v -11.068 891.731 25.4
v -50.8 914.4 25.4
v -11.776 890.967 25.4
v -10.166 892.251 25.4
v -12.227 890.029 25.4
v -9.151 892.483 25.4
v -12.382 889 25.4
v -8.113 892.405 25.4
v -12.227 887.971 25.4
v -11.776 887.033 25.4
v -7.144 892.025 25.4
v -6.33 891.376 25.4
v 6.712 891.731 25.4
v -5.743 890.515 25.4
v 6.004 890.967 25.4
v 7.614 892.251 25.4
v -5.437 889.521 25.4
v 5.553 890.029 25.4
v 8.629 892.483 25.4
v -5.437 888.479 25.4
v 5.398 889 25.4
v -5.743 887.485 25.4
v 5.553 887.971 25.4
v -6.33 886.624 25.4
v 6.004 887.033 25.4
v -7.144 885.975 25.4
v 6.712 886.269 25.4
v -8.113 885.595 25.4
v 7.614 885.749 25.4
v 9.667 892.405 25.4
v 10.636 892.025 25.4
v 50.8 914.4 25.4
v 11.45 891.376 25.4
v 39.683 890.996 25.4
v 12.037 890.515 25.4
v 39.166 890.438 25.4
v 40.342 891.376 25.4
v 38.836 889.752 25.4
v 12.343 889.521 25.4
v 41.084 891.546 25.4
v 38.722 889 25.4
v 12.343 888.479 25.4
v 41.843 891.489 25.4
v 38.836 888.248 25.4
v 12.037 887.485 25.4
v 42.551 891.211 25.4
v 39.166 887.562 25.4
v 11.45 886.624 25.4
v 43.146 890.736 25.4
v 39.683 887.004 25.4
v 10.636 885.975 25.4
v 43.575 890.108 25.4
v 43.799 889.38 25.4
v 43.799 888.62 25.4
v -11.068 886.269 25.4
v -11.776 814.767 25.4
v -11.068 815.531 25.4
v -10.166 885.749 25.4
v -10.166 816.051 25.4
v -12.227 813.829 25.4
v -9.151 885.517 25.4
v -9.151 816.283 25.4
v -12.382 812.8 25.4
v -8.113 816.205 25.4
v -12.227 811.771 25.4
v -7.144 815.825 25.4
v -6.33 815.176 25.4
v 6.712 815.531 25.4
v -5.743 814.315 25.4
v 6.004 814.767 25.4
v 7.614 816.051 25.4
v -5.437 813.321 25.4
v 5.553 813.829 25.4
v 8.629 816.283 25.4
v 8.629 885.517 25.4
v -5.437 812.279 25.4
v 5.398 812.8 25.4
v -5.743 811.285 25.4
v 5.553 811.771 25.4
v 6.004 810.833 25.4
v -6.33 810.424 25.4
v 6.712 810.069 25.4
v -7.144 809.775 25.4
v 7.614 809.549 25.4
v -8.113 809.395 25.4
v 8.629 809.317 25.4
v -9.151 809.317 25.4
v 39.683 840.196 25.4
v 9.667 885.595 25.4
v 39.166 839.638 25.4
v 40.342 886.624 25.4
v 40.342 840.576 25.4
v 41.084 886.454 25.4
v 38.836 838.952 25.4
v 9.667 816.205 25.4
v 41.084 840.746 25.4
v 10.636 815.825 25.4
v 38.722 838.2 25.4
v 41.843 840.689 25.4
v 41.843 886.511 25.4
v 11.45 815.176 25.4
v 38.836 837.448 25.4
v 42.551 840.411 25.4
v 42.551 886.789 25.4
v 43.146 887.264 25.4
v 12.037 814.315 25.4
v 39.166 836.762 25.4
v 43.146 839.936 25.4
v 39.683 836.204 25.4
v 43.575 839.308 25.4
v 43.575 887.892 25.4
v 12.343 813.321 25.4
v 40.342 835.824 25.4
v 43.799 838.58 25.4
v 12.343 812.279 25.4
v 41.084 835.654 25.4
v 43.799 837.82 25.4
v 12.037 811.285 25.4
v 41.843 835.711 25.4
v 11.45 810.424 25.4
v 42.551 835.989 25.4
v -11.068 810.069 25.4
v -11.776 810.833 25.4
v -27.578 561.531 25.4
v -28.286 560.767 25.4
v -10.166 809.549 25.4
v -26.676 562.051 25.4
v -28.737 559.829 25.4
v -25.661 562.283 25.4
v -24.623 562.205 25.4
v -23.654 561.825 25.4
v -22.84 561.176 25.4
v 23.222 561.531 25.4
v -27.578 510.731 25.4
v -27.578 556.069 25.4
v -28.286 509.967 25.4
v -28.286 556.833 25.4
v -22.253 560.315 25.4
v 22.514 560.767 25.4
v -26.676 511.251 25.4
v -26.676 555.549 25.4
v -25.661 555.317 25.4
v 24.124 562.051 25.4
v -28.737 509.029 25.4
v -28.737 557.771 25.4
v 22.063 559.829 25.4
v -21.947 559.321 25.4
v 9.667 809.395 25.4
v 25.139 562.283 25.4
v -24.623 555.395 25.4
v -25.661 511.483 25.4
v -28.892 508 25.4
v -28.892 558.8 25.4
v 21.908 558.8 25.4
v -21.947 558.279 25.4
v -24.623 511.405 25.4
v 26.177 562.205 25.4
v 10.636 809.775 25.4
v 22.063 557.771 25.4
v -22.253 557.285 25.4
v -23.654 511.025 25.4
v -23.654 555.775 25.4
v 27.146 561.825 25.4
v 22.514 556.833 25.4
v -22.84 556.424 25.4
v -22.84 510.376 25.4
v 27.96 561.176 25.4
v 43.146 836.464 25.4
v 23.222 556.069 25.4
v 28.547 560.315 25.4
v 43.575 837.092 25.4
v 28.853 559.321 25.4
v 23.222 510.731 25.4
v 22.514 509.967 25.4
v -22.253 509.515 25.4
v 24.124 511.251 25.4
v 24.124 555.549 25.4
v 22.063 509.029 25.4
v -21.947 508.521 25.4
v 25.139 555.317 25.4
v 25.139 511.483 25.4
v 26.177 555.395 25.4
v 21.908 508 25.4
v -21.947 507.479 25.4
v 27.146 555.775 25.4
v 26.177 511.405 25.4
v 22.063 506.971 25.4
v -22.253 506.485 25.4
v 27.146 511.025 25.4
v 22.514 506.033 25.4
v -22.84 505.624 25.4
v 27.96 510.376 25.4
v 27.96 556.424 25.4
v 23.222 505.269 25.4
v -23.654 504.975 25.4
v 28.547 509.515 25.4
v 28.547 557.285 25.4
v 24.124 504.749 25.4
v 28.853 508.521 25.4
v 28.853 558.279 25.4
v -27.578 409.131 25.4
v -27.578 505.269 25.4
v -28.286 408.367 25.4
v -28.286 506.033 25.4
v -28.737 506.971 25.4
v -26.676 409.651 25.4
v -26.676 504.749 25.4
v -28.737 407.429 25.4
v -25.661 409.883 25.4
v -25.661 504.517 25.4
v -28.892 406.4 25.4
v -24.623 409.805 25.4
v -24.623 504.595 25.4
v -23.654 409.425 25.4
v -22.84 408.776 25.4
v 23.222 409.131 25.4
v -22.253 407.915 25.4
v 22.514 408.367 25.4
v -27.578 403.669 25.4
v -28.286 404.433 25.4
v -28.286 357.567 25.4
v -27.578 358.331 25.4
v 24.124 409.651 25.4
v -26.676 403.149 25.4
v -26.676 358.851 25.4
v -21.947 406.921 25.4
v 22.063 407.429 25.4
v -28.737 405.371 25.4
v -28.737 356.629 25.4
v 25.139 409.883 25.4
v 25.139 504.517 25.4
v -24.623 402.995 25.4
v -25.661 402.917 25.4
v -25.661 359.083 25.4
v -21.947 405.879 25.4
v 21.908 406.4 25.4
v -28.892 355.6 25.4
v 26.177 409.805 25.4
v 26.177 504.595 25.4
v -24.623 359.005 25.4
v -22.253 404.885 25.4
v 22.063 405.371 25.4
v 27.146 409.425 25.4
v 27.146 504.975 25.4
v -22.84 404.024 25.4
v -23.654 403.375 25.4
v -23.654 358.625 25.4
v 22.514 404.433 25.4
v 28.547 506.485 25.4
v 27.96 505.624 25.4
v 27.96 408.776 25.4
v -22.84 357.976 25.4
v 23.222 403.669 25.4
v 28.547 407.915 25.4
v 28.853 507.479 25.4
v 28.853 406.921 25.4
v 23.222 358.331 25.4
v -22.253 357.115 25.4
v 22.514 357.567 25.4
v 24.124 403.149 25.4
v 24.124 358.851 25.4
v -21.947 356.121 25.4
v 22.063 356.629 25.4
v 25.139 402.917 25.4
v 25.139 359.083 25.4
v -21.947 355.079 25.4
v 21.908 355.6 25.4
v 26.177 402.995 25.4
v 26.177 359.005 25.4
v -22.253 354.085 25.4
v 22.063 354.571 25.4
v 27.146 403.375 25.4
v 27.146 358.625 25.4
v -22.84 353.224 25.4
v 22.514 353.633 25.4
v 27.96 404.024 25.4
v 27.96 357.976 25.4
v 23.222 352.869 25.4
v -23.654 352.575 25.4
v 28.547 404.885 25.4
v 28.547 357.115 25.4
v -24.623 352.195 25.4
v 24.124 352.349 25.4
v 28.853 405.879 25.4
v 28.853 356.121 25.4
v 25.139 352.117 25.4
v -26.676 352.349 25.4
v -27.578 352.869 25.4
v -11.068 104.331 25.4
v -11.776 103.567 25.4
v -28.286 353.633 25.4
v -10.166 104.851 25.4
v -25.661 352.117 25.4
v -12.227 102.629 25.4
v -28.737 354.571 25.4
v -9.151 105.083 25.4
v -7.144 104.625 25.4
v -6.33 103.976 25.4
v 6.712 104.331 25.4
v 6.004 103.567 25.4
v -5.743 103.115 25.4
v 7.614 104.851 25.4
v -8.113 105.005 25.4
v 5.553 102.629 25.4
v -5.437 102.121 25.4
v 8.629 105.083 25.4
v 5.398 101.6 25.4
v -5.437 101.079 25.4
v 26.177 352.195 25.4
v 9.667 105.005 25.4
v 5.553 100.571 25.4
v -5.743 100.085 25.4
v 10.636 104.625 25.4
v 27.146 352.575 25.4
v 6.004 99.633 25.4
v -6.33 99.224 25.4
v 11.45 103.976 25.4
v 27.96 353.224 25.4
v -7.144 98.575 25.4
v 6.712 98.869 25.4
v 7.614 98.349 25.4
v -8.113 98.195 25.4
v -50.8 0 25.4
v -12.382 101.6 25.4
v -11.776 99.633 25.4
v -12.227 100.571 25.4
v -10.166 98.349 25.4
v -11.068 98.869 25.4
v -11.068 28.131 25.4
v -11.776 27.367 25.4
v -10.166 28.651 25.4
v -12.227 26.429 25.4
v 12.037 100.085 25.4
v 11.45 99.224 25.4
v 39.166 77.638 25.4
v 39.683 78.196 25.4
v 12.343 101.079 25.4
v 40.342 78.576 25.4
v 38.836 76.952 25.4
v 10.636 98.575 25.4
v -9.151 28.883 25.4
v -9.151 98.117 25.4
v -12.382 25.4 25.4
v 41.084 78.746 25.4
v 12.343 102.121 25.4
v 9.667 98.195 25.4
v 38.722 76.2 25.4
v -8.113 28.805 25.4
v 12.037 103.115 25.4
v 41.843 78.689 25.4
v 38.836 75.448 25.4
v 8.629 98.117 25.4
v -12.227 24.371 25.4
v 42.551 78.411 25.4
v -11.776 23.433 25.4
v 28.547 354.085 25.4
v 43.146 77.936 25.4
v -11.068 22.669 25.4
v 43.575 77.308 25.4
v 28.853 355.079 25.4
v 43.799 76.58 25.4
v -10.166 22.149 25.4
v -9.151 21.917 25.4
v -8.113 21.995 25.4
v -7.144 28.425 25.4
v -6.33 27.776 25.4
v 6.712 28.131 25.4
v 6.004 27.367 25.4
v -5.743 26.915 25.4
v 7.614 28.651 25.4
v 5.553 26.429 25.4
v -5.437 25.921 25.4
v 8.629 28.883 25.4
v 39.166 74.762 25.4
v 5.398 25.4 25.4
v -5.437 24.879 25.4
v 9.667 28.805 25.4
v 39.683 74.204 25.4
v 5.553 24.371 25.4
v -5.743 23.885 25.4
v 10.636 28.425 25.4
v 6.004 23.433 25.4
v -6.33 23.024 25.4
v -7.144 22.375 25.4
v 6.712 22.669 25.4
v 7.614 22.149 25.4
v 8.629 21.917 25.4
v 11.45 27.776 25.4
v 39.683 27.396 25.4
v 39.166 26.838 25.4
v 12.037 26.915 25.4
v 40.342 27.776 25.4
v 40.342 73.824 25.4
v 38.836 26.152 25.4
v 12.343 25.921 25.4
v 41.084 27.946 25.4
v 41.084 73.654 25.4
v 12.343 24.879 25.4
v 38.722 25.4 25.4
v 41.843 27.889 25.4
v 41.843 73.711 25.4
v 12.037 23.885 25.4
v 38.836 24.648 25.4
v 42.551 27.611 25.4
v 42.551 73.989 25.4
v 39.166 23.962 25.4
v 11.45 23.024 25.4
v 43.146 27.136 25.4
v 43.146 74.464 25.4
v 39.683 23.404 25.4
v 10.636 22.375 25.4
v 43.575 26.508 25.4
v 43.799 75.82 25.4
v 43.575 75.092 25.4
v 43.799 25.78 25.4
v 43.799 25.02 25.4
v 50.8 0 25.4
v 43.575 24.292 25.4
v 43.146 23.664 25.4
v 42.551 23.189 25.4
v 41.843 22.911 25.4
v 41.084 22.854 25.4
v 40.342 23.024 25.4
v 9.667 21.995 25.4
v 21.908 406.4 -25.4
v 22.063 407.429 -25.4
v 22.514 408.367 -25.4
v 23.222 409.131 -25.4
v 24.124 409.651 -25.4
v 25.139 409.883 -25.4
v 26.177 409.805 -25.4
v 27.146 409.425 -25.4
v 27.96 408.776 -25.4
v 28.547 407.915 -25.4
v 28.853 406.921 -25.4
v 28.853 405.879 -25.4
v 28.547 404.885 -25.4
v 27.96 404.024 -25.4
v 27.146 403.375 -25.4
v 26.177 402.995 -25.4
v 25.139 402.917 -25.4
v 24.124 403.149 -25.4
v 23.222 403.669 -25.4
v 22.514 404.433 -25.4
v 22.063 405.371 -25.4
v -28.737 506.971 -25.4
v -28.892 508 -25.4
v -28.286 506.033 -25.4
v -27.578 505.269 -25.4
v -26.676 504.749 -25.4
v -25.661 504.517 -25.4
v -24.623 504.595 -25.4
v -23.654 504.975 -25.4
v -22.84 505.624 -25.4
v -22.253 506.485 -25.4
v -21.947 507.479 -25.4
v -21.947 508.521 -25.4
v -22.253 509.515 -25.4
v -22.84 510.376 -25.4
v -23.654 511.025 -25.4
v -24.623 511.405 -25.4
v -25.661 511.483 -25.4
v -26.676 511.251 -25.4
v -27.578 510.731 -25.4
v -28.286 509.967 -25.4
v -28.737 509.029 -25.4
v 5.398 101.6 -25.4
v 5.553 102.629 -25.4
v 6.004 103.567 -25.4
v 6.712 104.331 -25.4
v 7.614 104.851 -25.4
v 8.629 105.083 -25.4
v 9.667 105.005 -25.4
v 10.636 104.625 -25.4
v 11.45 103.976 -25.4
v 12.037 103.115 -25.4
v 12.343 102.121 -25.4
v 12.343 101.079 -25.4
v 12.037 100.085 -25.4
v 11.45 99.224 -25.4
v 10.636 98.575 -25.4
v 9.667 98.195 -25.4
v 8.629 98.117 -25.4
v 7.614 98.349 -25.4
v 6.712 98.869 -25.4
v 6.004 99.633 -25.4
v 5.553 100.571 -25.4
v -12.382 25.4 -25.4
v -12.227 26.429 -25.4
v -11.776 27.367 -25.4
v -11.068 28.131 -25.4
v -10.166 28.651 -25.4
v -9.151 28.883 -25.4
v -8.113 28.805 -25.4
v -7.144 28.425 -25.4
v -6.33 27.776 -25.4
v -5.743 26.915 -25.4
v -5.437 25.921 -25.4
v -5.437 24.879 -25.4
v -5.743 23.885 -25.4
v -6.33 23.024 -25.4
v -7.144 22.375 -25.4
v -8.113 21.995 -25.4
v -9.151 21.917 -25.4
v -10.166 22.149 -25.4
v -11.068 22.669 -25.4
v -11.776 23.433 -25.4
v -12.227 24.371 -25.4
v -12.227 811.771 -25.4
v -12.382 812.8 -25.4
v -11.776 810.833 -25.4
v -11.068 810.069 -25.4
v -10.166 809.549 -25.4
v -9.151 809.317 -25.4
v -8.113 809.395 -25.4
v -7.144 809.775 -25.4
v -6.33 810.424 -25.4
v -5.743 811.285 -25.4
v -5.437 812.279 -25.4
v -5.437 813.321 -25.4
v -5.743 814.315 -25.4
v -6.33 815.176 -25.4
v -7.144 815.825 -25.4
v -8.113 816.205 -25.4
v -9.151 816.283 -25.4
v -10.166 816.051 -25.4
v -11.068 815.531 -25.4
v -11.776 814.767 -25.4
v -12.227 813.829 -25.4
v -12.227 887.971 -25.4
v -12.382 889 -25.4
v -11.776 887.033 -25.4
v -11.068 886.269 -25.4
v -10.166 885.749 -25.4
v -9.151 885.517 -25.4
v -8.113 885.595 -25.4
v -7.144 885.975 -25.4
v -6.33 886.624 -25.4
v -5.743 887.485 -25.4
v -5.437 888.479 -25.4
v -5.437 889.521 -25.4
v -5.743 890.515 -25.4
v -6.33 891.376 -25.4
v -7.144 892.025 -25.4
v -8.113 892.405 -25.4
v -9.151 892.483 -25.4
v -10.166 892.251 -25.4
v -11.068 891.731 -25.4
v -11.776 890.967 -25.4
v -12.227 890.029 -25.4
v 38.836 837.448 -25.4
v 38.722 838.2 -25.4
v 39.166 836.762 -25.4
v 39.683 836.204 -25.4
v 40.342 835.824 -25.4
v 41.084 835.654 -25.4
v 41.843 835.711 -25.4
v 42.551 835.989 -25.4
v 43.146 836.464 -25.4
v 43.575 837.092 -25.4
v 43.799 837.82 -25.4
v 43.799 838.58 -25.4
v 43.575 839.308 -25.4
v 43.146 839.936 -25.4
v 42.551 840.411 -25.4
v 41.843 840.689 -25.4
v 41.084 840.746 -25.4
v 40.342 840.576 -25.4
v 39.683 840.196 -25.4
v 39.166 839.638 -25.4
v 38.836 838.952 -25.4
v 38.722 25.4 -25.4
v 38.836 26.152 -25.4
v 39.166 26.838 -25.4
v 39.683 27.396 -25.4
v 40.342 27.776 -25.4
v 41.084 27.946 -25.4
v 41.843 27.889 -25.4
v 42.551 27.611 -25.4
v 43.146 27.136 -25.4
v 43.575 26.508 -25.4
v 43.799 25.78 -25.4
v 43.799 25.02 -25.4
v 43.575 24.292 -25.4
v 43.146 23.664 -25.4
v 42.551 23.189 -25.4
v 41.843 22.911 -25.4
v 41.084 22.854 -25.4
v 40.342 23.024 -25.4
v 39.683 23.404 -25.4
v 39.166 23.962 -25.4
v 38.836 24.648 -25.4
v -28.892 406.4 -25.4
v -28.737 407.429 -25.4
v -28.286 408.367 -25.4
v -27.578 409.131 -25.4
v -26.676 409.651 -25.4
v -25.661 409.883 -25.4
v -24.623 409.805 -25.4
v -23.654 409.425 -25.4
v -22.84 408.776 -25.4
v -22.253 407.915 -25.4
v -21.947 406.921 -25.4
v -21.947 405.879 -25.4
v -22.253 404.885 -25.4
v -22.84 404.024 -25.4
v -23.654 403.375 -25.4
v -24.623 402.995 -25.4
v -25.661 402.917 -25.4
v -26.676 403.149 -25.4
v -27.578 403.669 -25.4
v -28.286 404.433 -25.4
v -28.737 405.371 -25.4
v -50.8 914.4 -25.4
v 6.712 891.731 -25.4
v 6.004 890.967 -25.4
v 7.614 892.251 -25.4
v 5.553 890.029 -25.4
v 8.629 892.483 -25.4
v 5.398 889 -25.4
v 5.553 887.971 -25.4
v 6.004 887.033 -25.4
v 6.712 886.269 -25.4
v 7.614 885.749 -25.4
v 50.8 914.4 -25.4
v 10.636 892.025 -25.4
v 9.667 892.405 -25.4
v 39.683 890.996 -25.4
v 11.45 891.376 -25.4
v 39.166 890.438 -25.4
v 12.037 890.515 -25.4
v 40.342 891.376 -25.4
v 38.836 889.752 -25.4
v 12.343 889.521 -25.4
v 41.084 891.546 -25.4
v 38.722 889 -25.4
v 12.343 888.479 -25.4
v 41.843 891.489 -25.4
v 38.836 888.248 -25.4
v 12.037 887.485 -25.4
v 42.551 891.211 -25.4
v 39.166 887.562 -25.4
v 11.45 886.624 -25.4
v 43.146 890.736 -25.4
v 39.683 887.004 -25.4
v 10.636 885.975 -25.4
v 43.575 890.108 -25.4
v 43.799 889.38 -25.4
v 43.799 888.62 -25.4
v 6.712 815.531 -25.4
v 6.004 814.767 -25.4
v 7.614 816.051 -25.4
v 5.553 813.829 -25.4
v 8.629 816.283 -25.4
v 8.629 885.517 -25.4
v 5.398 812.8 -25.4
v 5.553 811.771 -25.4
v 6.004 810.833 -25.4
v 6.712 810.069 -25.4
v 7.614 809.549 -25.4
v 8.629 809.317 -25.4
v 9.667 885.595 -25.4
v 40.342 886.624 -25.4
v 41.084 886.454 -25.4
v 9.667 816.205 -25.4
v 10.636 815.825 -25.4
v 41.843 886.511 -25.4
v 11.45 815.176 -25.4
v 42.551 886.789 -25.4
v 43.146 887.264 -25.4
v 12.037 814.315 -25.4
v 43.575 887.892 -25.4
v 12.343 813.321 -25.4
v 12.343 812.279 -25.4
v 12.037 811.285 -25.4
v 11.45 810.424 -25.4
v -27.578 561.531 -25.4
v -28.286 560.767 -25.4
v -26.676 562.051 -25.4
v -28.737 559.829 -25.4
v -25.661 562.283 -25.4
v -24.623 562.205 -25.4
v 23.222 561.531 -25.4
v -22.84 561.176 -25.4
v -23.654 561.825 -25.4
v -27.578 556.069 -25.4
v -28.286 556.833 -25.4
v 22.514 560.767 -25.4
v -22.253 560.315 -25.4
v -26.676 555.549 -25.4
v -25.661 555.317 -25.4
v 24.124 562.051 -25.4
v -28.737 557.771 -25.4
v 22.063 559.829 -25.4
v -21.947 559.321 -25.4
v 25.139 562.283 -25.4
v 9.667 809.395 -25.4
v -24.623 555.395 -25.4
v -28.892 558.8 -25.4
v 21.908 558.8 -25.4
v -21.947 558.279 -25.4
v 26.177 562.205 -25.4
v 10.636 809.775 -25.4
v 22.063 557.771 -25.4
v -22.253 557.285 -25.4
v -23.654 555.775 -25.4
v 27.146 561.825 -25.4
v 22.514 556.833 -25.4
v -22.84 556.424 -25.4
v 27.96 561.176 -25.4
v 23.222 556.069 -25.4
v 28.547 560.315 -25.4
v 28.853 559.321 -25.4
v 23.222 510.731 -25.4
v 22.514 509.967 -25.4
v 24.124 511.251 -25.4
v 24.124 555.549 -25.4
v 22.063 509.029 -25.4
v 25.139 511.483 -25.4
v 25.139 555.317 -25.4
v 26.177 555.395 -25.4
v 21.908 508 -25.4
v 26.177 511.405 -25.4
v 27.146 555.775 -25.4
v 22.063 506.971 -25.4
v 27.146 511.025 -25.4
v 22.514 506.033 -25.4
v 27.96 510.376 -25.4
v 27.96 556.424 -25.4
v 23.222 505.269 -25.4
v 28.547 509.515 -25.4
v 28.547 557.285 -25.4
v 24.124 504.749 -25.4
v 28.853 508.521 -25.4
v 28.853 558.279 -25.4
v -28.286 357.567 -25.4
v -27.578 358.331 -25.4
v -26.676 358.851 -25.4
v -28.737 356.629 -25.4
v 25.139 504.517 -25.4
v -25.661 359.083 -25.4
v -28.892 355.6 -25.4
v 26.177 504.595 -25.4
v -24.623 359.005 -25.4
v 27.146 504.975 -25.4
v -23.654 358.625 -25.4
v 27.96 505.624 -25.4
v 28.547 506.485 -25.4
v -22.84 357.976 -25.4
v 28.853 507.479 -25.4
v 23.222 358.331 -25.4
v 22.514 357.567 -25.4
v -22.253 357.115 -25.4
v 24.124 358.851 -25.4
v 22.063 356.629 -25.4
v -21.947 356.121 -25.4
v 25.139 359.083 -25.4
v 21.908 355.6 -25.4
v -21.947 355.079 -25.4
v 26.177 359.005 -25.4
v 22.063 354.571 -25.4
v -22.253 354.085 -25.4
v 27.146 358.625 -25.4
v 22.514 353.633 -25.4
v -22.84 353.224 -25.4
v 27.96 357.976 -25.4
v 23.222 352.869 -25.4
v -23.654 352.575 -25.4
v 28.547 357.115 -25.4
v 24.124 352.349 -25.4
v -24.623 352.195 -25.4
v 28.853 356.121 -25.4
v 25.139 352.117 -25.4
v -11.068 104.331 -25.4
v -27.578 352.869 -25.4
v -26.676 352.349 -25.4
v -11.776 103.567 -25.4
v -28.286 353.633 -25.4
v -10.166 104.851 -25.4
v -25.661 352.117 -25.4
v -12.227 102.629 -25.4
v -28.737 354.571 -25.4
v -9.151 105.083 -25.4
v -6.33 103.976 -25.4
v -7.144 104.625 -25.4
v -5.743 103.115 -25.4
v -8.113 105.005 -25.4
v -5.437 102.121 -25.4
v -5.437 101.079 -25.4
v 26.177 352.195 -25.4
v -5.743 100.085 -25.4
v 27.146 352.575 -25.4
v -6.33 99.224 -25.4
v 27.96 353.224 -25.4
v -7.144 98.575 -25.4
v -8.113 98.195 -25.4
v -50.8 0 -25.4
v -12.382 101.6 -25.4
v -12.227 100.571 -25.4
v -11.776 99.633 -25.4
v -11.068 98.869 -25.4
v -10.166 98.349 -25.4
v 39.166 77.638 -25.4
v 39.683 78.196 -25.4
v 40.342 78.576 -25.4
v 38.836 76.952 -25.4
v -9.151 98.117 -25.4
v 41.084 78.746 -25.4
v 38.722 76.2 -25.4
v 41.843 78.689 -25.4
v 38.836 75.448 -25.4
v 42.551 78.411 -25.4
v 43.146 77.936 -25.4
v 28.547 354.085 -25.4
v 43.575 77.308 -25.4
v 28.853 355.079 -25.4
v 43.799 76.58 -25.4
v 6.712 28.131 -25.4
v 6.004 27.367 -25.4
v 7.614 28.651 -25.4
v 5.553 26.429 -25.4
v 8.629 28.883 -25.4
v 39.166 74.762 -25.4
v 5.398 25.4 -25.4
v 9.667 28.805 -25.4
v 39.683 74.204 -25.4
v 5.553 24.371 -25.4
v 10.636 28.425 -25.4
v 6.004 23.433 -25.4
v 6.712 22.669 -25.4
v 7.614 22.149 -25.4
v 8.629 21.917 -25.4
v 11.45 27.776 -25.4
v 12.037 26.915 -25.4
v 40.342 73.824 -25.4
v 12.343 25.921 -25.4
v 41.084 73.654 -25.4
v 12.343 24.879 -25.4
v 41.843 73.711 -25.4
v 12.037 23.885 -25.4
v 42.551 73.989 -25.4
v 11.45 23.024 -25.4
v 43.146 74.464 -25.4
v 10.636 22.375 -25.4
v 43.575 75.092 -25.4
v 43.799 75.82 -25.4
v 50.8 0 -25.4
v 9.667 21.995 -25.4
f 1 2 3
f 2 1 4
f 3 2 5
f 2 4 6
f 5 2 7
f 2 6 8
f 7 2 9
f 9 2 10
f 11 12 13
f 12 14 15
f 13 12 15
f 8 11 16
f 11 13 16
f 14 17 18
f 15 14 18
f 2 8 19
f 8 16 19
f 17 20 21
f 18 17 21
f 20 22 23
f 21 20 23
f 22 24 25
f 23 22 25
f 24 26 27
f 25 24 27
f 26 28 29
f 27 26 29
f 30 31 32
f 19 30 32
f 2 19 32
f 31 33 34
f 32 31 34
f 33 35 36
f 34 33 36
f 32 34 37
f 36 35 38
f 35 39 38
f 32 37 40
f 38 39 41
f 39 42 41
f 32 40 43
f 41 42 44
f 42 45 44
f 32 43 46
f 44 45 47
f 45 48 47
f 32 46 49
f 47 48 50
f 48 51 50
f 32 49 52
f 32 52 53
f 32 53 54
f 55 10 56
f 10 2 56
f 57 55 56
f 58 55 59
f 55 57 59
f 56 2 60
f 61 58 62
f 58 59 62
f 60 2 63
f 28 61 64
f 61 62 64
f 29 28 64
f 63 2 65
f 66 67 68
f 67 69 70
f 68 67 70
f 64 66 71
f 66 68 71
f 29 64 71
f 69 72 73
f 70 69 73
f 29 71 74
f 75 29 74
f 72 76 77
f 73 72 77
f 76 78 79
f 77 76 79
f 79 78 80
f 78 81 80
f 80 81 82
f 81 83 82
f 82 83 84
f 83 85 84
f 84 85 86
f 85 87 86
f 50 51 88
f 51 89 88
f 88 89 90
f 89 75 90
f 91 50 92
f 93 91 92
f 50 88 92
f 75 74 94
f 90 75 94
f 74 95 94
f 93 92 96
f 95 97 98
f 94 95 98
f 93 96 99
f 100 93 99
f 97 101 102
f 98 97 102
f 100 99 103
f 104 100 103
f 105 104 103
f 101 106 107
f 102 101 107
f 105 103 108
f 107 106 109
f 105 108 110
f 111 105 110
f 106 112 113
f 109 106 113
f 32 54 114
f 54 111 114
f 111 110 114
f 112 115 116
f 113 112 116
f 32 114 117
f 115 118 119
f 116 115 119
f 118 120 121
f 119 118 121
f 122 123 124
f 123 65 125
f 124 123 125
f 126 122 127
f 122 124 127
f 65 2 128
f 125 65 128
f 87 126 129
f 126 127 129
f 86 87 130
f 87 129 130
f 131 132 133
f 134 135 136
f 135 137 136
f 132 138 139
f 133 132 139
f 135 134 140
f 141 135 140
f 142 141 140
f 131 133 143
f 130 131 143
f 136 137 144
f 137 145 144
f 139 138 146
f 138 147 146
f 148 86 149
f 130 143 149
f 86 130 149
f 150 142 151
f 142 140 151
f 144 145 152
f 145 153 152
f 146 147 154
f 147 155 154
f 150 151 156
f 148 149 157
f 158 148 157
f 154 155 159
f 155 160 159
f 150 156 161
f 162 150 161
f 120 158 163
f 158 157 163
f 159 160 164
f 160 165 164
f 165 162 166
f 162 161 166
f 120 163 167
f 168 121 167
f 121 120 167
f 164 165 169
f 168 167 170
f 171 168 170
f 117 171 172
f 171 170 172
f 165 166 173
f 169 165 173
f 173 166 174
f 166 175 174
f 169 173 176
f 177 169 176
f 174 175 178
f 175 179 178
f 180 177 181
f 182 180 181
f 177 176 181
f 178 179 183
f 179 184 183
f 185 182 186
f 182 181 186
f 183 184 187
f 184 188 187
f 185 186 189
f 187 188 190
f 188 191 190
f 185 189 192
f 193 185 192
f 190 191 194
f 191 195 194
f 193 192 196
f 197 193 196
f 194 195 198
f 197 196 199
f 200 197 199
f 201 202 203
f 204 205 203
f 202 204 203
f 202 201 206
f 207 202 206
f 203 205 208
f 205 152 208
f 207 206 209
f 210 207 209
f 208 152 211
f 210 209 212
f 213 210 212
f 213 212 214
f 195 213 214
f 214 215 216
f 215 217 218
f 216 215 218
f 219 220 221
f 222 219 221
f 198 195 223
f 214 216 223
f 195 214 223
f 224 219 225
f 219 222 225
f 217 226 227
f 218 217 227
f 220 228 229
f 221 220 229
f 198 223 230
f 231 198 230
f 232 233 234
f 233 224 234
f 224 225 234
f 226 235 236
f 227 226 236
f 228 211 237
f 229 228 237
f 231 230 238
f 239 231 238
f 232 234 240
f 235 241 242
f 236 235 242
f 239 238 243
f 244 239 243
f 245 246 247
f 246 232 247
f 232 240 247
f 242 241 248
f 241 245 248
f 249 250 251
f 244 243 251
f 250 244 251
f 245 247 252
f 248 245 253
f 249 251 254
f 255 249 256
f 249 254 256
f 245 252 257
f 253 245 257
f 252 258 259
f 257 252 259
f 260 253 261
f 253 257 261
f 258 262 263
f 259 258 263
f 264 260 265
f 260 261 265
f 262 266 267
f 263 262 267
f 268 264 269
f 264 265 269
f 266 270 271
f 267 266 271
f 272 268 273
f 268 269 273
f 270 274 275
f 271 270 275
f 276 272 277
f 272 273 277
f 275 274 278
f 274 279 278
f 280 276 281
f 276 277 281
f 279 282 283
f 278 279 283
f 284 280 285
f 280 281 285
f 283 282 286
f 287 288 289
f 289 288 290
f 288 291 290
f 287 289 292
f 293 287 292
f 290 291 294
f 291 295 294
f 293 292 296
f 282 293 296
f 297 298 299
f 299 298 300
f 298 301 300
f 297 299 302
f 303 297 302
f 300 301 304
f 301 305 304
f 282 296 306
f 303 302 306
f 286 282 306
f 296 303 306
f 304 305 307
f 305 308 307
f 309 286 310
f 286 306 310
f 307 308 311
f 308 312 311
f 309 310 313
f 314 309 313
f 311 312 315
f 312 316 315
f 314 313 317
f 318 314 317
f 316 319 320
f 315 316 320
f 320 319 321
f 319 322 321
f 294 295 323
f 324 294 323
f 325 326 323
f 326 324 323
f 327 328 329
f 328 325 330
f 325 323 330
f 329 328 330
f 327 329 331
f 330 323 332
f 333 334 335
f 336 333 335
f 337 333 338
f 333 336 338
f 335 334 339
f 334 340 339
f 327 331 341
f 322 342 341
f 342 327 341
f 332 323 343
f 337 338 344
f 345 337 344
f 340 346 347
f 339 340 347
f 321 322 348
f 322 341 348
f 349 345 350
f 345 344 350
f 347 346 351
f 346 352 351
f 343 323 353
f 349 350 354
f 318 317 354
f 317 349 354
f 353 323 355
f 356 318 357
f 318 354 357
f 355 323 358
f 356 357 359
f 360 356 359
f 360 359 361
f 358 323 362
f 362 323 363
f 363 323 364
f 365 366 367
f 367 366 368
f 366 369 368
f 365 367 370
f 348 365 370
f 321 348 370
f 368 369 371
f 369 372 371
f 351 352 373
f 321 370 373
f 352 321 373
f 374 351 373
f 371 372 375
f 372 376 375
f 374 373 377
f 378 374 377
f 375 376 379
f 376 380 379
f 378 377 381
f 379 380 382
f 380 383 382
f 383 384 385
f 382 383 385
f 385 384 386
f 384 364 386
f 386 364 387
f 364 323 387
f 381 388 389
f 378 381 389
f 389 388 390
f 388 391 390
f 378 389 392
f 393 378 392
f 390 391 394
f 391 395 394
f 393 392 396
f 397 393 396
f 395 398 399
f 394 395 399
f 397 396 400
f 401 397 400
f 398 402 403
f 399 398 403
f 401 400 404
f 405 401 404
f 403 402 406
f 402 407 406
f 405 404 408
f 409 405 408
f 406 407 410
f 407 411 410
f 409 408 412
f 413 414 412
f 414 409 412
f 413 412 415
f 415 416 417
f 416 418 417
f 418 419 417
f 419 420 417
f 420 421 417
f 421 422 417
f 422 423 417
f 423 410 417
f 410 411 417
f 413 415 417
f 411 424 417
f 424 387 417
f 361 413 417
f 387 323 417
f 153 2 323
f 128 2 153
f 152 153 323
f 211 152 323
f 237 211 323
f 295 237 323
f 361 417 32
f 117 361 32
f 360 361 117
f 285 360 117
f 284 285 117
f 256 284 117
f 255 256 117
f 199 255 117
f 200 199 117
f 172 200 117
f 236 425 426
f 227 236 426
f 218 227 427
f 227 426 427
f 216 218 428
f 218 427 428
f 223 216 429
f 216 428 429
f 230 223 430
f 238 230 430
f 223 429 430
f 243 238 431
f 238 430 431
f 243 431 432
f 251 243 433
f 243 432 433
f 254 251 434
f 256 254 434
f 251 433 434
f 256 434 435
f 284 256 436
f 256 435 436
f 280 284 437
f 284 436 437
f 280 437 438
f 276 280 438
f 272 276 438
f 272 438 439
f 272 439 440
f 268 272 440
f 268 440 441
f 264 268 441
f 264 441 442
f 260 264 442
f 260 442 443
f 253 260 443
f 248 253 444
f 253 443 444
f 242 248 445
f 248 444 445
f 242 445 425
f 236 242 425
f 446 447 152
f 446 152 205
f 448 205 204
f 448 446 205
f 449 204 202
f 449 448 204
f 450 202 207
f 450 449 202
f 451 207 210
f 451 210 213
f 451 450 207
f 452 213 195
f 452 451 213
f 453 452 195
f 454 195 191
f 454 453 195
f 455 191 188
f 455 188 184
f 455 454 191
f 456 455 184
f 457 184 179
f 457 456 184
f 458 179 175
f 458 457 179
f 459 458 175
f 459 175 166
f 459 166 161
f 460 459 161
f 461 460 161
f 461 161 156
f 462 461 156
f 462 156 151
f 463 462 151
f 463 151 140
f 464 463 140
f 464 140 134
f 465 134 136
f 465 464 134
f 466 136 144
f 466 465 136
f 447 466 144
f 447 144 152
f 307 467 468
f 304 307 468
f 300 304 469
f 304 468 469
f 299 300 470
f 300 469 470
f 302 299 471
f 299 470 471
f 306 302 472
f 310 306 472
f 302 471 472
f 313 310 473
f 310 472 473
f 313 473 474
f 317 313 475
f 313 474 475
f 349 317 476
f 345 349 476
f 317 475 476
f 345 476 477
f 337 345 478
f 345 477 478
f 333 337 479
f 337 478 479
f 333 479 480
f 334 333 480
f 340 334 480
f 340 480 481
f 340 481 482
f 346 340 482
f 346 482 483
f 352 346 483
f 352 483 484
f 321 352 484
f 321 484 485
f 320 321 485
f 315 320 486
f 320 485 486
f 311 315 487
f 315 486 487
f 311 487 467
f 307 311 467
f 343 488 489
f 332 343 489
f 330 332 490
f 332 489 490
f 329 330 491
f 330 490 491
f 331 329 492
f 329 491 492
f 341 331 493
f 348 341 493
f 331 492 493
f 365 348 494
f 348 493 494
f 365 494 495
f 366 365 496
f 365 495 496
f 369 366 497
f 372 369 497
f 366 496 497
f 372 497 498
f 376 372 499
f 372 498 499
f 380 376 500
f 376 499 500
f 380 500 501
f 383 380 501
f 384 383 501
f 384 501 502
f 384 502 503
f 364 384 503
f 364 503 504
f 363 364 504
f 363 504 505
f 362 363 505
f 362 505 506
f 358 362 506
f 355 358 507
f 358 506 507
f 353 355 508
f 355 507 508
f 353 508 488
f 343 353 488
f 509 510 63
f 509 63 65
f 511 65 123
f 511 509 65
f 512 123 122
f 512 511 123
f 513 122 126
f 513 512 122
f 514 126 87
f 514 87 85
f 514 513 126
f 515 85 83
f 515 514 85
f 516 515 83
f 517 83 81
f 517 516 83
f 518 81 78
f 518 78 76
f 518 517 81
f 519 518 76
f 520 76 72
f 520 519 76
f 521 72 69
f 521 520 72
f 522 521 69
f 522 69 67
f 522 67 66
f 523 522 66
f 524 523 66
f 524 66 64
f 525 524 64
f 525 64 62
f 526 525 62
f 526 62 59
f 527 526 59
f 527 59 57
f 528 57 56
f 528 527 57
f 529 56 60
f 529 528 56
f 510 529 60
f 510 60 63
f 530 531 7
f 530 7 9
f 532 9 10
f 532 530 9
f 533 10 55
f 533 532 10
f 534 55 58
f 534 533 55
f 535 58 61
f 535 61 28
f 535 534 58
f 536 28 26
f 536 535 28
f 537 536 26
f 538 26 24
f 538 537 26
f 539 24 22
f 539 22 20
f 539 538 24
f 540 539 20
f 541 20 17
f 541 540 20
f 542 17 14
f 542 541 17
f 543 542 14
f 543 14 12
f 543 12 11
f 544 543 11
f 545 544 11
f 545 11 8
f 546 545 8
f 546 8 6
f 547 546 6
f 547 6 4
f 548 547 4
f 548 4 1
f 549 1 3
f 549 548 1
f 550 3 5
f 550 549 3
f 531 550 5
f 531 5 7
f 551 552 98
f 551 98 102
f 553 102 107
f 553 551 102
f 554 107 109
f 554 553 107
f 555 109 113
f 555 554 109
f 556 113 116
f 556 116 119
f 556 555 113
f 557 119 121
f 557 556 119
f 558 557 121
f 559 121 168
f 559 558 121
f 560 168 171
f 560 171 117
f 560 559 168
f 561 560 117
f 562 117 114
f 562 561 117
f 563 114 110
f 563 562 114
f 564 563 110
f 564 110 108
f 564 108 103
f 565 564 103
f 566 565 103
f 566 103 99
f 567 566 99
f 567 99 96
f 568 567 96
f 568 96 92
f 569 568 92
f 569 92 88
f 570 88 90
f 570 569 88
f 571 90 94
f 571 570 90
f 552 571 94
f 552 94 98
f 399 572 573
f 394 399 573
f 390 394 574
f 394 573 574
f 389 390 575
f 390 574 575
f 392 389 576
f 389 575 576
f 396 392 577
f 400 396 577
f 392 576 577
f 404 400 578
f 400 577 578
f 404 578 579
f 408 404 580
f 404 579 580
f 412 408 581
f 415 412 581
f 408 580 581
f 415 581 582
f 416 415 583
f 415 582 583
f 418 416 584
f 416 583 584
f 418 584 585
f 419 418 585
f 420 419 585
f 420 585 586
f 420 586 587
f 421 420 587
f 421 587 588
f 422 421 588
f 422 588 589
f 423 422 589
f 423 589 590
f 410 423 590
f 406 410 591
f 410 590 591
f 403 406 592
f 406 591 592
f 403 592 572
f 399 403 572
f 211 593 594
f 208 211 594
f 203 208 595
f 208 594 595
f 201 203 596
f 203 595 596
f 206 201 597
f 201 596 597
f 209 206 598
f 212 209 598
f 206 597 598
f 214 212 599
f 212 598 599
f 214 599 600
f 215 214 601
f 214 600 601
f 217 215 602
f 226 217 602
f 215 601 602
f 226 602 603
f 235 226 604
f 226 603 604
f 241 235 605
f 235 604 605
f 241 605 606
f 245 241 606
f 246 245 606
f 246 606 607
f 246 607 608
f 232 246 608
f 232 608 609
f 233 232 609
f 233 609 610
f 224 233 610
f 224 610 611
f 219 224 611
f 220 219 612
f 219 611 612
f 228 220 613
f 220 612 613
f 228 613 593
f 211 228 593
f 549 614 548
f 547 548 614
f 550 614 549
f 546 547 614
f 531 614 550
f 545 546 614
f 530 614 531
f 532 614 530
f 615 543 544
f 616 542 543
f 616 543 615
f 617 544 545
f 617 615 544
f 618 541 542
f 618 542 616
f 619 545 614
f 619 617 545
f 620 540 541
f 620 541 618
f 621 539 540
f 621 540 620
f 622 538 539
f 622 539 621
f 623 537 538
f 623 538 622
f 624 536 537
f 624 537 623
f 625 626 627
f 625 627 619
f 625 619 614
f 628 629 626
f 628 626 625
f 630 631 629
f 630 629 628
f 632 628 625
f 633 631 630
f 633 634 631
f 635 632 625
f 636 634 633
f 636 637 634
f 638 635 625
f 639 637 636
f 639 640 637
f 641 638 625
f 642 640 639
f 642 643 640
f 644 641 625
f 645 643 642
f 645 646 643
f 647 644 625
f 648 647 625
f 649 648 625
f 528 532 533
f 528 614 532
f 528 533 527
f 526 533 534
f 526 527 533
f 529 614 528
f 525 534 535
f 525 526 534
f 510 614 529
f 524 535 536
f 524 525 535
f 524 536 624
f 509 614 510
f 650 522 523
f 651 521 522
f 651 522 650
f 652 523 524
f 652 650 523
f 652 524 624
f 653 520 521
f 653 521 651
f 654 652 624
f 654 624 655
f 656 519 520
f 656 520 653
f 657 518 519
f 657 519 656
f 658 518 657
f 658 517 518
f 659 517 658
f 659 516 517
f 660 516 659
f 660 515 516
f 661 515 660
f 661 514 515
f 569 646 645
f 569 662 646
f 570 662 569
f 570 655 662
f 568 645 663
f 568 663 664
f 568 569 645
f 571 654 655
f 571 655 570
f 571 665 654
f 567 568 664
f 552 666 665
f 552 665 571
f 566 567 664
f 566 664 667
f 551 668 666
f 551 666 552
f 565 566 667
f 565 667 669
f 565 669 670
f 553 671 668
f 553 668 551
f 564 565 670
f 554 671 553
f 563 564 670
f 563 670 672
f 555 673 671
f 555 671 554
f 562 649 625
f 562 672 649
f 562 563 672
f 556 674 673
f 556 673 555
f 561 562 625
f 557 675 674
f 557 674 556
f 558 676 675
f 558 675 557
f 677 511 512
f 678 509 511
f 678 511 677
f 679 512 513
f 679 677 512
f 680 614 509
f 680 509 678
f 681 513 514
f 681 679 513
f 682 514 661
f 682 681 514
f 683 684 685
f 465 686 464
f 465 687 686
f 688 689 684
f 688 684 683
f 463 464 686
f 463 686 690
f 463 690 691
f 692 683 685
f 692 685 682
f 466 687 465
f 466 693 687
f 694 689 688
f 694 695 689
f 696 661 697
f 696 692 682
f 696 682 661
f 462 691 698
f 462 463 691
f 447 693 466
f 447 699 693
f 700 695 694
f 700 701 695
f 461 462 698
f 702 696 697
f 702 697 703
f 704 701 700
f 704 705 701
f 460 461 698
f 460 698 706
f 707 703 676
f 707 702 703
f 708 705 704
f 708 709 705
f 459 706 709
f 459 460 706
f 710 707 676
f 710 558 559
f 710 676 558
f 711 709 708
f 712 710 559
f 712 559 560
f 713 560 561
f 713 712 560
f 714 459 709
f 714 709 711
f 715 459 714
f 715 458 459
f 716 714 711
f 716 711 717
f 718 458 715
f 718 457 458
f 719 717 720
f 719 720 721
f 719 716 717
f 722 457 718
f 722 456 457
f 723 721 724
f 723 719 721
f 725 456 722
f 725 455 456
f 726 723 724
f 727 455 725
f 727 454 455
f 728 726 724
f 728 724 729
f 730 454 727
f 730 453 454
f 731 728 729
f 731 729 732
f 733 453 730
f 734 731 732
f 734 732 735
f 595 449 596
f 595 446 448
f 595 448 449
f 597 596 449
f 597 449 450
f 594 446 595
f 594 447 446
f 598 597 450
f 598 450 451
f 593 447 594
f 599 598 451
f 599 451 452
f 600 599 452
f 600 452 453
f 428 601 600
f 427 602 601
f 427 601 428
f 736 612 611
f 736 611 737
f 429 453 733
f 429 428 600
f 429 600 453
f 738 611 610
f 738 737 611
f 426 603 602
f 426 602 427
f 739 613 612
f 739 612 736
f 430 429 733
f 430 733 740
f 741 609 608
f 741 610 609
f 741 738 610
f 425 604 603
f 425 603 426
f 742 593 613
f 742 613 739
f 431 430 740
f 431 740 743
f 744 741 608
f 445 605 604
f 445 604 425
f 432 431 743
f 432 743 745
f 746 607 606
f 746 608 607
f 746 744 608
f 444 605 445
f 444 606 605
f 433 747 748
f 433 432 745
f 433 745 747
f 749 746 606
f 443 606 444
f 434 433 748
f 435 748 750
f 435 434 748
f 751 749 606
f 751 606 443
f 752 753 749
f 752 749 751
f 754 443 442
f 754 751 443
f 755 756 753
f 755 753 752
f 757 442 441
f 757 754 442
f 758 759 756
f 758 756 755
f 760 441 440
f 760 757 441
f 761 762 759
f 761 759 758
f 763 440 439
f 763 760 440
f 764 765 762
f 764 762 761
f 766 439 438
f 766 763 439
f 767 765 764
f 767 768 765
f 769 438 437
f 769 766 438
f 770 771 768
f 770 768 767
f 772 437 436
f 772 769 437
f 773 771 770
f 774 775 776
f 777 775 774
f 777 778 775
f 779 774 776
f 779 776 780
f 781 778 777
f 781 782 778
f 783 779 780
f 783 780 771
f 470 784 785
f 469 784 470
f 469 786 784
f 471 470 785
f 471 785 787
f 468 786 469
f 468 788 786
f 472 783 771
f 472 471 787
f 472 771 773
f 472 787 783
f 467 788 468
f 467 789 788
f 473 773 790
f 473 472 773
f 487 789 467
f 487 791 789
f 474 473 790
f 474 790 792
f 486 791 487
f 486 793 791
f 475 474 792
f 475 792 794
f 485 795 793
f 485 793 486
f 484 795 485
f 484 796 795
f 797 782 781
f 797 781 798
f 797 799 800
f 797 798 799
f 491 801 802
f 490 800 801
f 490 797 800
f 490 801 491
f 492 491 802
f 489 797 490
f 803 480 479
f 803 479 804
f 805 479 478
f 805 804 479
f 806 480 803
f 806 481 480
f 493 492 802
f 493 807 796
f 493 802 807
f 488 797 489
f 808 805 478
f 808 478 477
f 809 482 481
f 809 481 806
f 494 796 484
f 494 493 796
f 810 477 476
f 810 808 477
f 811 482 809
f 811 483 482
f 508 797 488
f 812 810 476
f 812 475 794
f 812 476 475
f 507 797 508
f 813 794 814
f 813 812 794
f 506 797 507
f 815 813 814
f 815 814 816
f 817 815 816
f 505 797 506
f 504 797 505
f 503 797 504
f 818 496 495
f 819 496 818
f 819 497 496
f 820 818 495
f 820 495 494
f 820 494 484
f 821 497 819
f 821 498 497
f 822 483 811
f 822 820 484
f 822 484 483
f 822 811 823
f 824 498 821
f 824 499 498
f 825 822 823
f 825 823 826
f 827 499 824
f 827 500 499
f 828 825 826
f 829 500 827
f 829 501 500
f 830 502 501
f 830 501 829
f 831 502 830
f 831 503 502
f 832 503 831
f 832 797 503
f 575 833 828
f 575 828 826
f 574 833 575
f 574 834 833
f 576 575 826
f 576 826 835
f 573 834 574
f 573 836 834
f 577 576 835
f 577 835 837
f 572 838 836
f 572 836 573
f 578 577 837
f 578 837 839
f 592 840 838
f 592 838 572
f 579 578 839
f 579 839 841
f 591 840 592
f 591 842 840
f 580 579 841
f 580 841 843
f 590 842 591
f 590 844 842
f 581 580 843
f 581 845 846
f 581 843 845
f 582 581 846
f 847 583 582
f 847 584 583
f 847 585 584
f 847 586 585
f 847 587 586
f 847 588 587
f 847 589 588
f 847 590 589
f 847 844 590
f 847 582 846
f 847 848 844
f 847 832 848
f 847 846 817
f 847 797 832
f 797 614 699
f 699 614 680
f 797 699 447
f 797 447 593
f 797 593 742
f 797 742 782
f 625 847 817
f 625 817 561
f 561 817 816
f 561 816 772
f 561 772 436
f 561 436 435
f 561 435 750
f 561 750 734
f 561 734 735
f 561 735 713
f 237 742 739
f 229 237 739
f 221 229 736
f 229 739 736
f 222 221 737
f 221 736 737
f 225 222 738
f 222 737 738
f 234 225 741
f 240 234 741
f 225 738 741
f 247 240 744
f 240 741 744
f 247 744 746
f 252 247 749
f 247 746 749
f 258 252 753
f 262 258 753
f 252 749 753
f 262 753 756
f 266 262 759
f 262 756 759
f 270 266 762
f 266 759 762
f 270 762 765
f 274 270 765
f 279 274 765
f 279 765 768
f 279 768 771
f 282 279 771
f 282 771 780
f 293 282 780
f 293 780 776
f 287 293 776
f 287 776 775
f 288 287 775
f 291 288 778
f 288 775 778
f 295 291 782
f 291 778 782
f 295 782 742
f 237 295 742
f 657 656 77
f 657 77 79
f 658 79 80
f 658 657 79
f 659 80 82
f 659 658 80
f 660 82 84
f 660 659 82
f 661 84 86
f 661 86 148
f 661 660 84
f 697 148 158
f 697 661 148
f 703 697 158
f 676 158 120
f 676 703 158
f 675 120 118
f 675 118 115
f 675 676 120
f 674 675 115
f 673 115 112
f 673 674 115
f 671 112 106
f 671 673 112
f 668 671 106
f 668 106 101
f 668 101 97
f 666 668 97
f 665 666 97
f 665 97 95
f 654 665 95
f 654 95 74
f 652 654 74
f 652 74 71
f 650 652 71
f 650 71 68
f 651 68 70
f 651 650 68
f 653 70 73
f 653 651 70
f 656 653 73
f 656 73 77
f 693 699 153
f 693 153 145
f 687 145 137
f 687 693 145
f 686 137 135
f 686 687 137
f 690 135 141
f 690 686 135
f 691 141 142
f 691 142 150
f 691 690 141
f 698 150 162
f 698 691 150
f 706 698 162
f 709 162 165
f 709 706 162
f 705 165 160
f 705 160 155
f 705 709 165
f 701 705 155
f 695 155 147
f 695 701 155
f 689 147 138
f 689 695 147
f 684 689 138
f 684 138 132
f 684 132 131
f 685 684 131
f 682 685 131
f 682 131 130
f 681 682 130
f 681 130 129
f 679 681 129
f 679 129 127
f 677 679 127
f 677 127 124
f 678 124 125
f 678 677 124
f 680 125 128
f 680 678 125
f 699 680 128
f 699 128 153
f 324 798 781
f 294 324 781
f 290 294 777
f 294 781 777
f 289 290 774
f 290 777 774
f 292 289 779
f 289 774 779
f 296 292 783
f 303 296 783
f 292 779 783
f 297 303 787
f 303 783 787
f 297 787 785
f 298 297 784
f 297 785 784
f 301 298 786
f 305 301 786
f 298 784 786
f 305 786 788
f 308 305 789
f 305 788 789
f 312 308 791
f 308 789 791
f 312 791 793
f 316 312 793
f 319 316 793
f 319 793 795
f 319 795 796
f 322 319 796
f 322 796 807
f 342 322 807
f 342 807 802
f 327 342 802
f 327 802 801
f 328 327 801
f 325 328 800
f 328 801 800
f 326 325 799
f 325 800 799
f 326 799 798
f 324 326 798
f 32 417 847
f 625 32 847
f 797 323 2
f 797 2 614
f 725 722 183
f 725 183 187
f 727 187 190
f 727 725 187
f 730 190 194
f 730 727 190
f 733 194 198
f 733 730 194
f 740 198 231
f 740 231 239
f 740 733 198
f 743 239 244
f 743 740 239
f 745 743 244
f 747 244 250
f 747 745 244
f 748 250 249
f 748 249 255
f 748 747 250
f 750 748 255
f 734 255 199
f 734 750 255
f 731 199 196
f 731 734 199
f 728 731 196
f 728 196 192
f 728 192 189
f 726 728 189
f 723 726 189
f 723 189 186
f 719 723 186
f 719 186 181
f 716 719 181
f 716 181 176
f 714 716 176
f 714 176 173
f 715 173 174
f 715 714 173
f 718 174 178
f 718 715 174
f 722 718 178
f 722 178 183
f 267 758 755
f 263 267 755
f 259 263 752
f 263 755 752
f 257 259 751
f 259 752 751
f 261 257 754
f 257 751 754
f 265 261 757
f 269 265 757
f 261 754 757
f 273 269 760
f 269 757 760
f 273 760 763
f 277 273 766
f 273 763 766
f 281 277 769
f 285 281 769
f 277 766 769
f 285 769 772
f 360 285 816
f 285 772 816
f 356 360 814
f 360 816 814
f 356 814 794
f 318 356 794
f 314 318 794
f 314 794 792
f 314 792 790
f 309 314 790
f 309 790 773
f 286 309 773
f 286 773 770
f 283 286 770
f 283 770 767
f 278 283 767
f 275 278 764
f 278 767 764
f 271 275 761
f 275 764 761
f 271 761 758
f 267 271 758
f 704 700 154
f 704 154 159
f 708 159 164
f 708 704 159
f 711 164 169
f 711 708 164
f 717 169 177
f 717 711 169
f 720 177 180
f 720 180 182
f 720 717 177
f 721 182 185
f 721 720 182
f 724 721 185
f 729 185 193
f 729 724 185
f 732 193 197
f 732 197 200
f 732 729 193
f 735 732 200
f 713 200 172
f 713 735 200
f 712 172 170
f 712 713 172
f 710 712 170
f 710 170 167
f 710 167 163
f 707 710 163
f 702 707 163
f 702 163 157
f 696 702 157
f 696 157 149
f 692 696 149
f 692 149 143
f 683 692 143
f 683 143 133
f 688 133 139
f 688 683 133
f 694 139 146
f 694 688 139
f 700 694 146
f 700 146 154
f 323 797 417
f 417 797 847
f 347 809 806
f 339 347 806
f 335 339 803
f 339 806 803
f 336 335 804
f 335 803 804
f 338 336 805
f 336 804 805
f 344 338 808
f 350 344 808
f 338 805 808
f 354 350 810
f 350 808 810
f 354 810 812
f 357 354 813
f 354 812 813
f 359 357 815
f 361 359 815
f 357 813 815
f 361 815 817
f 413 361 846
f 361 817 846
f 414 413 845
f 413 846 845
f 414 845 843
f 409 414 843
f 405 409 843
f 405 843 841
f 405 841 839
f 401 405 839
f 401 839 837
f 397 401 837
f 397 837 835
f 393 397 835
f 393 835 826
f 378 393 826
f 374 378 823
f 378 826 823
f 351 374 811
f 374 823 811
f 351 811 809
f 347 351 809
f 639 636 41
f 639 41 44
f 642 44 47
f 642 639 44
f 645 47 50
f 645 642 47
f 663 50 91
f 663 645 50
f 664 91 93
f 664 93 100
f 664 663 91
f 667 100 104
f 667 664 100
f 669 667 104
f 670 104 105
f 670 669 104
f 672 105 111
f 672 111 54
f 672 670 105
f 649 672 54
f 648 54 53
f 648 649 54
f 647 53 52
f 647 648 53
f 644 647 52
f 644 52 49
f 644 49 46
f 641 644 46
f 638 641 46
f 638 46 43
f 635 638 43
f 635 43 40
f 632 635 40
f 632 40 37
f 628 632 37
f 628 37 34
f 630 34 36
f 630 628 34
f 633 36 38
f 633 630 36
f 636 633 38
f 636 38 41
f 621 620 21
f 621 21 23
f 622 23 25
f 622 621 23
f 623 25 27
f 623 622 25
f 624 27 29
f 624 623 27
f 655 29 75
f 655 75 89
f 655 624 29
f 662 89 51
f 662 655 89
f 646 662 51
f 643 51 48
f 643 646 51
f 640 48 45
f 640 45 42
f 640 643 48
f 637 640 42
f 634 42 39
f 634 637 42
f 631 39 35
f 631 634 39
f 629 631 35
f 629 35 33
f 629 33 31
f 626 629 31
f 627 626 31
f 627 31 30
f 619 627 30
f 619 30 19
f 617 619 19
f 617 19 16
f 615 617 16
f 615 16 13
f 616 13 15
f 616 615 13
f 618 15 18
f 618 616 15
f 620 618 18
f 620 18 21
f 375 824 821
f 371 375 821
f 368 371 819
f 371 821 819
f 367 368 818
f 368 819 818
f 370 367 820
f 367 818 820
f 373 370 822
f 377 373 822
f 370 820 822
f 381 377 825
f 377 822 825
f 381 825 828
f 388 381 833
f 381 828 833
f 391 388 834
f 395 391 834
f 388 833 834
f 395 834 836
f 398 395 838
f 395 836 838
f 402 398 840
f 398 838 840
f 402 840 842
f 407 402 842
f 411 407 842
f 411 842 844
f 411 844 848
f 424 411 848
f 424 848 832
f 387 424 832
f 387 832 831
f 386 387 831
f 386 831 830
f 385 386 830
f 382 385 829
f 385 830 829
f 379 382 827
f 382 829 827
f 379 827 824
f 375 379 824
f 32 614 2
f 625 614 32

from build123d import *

# Parameters (mm, degrees)
SKETCH1_W           = 101.6
SKETCH1_H           = 50.8
BOSS_EXTRUDE1_DEPTH = 914.4
SKETCH3_R           = 3.4925
CUT_EXTRUDE1_DEPTH  = 50.8
SKETCH4_R           = 2.5527
CUT_EXTRUDE2_DEPTH  = 50.8
SKETCH5_R           = 3.4925
CUT_EXTRUDE3_DEPTH  = 50.8


with BuildPart() as part:
    # Sketch1 → Boss-Extrude1 (new body)
    with BuildSketch(Plane(origin=(0, 0, 0), x_dir=(1, 0, 0), z_dir=(0, 1, 0))):
        Rectangle(SKETCH1_W, SKETCH1_H)
    extrude(amount=BOSS_EXTRUDE1_DEPTH)

    # Sketch3 → Cut-Extrude1 (cut)
    with BuildSketch(Plane(origin=(0, 0, -25.4), x_dir=(-1, 0, 0), z_dir=(0, 0, -1))):
        with Locations((-8.89, 25.4)):
            Circle(SKETCH3_R)
        with Locations((8.89, 25.4)):
            Circle(SKETCH3_R)
        with Locations((8.89, 101.6)):
            Circle(SKETCH3_R)
        with Locations((-8.89, 101.6)):
            Circle(SKETCH3_R)
    cut_extrude1 = extrude(amount=-CUT_EXTRUDE1_DEPTH, mode=Mode.SUBTRACT)

    # Sketch4 → Cut-Extrude2 (cut)
    with BuildSketch(Plane(origin=(0, 0, -25.4), x_dir=(-1, 0, 0), z_dir=(0, 0, -1))):
        with Locations((-41.275, 76.2)):
            Circle(SKETCH4_R)
        with Locations((-41.275, 25.4)):
            Circle(SKETCH4_R)
    cut_extrude2 = extrude(amount=-CUT_EXTRUDE2_DEPTH, mode=Mode.SUBTRACT)

    # Mirror1: Cut-Extrude1, Cut-Extrude2 across plane
    add(cut_extrude1.mirror(Plane.ZX.offset(457.2)), mode=Mode.SUBTRACT)
    add(cut_extrude2.mirror(Plane.ZX.offset(457.2)), mode=Mode.SUBTRACT)

    # Sketch5 → Cut-Extrude3 (cut)
    with BuildSketch(Plane(origin=(0, 0, -25.4), x_dir=(-1, 0, 0), z_dir=(0, 0, -1))):
        with Locations((-25.4, 406.4)):
            Circle(SKETCH5_R)
        with Locations((25.4, 406.4)):
            Circle(SKETCH5_R)
        with Locations((25.4, 355.6)):
            Circle(SKETCH5_R)
        with Locations((-25.4, 355.6)):
            Circle(SKETCH5_R)
    cut_extrude3 = extrude(amount=-CUT_EXTRUDE3_DEPTH, mode=Mode.SUBTRACT)

    # Mirror2: Cut-Extrude3 across plane
    add(cut_extrude3.mirror(Plane.ZX.offset(457.2)), mode=Mode.SUBTRACT)


solid = part.part
